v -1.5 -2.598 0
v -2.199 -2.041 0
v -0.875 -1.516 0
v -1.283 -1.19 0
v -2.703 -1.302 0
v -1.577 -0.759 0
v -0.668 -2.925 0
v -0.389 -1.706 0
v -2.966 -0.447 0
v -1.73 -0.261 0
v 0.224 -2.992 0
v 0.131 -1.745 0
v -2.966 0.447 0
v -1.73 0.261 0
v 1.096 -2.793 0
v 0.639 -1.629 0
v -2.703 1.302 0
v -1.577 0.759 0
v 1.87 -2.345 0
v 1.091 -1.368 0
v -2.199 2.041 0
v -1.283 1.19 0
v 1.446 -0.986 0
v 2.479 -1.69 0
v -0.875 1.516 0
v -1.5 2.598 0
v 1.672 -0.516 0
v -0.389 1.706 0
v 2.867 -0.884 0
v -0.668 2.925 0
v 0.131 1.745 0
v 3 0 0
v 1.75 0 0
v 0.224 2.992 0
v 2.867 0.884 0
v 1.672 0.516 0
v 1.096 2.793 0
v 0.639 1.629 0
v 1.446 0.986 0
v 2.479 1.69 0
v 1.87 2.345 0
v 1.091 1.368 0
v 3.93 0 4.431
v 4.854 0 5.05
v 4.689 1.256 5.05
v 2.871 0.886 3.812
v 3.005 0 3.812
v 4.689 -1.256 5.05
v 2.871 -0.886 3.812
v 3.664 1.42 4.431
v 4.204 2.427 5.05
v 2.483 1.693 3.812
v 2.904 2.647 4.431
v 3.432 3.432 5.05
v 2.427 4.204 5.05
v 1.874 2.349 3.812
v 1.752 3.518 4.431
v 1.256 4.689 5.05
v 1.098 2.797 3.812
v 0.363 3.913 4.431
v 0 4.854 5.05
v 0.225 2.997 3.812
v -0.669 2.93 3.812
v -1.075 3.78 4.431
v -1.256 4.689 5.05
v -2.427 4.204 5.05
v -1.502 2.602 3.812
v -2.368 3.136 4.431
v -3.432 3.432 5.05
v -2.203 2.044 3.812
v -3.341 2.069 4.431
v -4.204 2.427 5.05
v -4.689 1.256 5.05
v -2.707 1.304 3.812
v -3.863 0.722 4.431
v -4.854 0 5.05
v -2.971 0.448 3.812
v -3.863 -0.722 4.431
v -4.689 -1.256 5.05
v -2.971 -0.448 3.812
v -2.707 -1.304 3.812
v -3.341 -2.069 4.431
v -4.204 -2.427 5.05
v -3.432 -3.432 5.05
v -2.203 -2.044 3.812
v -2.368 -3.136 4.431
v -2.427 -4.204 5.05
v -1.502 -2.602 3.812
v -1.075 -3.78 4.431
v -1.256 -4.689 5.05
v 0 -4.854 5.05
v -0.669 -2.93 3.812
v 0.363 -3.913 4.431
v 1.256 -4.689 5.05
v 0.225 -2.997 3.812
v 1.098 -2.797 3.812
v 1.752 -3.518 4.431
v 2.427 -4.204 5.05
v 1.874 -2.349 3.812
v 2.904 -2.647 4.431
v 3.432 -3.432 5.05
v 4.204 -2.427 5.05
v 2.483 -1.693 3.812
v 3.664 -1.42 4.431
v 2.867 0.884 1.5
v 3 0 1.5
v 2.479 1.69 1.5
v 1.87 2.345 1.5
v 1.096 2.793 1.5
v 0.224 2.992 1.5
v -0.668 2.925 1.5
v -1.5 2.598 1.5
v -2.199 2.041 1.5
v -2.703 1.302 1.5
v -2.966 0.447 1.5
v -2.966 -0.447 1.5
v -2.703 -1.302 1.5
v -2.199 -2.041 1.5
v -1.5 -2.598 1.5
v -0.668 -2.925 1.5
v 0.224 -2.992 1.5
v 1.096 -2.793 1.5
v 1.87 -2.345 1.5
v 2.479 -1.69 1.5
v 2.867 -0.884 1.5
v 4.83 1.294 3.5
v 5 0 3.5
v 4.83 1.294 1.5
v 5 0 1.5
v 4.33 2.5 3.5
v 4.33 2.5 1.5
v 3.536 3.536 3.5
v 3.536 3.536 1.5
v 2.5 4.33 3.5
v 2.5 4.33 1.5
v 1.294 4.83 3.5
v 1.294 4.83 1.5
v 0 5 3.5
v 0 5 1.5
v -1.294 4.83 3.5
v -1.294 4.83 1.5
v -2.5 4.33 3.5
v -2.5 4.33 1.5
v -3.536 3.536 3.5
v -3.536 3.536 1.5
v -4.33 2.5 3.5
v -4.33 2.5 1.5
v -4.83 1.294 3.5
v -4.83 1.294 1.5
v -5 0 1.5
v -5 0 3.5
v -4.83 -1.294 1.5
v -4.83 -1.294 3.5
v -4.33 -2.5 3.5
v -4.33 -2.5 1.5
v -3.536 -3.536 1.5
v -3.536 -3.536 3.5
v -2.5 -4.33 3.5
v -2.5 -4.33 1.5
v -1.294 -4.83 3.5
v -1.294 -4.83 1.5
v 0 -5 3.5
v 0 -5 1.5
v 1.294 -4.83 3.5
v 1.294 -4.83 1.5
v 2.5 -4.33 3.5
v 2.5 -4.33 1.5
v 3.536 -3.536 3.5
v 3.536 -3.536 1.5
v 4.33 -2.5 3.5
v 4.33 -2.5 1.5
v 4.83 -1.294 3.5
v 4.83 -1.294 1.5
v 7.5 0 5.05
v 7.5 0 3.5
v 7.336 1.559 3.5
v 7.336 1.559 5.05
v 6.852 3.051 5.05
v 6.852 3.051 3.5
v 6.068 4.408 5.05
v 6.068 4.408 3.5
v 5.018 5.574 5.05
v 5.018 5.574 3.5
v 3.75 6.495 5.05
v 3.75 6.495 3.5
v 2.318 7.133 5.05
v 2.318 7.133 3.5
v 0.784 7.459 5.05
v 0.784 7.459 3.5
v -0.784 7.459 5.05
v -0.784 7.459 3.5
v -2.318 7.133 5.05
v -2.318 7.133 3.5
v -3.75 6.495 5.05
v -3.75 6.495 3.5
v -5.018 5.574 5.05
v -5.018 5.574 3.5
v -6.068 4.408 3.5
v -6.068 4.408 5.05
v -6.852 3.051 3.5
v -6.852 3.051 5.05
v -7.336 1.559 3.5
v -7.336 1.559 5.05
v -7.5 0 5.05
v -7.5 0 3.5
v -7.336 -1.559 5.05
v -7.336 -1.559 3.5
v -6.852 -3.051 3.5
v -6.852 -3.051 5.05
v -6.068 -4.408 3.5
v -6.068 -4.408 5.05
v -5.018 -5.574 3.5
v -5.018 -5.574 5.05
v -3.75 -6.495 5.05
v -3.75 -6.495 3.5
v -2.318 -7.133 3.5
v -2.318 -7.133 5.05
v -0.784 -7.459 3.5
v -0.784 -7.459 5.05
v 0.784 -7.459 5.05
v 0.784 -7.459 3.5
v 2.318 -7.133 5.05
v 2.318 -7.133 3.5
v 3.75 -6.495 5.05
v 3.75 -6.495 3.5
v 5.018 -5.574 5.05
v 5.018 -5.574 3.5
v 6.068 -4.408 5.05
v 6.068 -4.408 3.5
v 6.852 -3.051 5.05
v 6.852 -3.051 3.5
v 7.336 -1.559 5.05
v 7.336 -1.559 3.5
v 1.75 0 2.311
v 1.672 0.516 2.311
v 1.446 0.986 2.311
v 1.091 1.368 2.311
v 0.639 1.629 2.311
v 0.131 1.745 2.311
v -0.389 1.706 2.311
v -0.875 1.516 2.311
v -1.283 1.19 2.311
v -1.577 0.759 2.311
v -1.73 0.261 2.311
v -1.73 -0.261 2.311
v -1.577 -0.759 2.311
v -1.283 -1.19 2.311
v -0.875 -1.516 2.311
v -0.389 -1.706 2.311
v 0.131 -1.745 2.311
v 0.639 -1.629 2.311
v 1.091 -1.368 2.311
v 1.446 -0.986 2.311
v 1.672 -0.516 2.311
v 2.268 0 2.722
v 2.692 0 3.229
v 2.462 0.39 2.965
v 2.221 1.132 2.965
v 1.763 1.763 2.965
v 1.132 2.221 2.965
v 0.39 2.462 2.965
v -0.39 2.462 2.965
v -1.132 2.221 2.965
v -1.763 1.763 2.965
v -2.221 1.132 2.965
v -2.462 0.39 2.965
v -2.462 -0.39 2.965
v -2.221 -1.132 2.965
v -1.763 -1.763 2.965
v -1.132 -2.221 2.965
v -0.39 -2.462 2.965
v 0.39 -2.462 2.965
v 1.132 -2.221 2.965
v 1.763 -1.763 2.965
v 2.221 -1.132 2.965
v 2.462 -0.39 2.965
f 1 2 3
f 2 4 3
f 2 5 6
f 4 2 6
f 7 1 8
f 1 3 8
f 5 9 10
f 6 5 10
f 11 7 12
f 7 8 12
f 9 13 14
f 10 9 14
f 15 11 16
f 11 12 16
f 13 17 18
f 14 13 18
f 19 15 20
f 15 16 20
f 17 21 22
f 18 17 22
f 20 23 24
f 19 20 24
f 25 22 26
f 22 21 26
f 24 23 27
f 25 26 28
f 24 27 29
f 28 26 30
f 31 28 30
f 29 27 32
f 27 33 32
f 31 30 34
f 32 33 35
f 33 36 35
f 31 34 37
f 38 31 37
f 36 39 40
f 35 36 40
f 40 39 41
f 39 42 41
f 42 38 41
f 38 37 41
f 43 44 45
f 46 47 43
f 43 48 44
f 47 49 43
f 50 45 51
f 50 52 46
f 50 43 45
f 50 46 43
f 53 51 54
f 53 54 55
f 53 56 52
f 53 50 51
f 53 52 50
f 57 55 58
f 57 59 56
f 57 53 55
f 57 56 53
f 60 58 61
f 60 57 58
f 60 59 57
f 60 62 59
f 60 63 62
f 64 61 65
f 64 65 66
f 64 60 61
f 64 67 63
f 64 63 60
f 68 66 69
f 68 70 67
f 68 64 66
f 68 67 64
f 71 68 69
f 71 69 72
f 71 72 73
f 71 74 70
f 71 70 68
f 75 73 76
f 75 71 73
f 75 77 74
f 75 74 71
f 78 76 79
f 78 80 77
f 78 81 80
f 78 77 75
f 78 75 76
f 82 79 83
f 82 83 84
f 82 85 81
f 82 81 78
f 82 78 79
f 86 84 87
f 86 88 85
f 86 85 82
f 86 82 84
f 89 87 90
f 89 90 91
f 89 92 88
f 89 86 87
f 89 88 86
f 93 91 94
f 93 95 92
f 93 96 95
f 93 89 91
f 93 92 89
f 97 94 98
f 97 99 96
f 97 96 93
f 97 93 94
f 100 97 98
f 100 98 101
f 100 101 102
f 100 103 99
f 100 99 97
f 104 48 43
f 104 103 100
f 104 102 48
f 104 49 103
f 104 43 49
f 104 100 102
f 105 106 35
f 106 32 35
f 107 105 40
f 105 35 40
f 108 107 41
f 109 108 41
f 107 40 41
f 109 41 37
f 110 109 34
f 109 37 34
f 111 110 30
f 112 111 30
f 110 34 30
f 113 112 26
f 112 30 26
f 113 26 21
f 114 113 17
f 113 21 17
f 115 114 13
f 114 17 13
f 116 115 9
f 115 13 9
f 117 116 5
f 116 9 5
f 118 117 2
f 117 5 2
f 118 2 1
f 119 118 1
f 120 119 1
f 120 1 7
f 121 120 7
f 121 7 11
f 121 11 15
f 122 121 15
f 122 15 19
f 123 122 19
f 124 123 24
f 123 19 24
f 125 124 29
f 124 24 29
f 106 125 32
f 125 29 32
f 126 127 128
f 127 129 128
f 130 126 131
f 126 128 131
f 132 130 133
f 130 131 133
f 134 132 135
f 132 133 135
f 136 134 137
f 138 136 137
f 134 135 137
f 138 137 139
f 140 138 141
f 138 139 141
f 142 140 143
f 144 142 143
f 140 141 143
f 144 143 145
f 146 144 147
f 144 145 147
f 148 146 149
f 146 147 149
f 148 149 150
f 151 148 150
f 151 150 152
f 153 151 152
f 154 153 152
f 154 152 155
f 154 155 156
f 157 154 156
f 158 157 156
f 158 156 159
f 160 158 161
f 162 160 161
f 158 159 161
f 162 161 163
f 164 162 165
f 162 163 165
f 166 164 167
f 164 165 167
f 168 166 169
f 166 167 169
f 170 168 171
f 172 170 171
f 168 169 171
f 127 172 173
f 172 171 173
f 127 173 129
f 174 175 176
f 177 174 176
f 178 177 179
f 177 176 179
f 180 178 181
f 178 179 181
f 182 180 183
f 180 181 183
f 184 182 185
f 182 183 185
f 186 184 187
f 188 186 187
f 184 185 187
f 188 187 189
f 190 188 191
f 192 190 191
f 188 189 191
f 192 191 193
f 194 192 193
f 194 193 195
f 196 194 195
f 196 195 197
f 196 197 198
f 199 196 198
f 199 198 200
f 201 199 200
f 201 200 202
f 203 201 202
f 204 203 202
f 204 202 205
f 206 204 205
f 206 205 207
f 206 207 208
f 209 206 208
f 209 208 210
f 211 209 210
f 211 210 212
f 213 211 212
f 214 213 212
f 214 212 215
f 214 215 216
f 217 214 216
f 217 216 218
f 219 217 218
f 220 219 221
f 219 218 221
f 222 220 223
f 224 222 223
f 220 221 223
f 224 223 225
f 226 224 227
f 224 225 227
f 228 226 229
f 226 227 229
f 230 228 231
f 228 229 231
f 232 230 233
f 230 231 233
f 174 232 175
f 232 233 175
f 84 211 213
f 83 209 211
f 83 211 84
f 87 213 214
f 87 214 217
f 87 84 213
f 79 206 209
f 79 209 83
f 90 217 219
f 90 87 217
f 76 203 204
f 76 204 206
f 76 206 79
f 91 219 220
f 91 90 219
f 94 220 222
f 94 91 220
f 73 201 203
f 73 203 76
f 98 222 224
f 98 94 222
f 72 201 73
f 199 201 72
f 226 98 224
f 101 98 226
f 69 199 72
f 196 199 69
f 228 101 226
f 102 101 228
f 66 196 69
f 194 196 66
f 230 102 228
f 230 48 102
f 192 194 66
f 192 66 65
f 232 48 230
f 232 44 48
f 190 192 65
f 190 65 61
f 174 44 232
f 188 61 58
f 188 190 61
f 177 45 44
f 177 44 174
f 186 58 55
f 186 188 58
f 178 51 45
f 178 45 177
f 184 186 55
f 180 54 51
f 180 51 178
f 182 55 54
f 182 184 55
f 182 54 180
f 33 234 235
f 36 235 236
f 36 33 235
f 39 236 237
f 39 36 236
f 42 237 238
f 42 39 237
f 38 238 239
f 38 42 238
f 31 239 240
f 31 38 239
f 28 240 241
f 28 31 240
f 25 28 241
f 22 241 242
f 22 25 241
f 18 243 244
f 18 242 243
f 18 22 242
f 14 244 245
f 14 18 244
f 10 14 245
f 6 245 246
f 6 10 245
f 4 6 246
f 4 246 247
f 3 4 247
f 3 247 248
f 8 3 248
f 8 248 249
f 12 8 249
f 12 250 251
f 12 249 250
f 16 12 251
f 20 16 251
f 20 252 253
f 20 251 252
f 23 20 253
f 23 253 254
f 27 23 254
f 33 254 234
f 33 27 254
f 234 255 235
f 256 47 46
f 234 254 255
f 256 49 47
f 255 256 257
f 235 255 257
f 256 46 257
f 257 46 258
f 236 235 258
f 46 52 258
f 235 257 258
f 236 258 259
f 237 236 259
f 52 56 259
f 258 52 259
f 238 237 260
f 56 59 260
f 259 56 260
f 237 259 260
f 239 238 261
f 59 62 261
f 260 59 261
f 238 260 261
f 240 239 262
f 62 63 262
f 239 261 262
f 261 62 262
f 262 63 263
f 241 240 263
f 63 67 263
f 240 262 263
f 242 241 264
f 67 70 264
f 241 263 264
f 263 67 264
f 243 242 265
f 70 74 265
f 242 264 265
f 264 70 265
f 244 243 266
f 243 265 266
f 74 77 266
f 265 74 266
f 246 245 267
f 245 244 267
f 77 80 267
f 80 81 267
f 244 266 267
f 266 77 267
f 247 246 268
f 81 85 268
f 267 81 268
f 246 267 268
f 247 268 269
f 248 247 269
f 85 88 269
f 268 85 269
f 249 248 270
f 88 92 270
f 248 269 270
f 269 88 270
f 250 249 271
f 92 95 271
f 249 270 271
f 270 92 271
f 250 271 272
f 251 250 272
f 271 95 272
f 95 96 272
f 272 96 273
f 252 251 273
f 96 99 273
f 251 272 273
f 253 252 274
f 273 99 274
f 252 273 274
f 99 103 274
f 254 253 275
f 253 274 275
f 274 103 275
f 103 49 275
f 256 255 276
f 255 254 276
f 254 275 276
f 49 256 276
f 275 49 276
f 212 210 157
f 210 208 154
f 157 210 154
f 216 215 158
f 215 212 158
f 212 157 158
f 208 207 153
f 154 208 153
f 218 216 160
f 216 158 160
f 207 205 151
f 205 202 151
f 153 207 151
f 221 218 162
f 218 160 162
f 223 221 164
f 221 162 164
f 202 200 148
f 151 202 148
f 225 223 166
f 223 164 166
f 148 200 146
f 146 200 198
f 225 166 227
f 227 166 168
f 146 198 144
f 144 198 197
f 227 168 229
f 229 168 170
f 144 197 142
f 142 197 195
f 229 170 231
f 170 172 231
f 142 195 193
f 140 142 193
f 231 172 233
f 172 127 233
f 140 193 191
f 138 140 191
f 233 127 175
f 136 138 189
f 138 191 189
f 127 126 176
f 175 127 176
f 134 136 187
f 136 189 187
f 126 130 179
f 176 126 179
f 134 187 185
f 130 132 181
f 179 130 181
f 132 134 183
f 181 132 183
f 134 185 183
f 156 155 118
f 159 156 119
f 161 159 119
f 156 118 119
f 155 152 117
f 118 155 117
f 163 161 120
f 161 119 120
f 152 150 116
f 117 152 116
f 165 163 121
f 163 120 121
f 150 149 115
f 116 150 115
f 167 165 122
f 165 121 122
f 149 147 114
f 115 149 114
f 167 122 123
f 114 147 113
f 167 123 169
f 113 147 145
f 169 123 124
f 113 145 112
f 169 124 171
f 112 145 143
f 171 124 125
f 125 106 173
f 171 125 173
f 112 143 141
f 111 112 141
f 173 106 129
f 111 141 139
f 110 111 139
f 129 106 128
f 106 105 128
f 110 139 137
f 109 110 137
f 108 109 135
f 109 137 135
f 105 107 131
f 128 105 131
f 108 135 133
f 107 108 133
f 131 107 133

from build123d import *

# Parameters (mm, degrees)
F0_R     = 7.5
F0_R_2   = 1.75
F1_DEPTH = 5.05


# Not quite as in the source:
# - a fillet or chamfer that OpenCascade refuses, or shapes differently, is made with other operations: its cross-section is extruded or revolved along the edge and cut away or added


with BuildPart() as f1:
    # F0 (on Top) → F1 (new body)
    with BuildSketch(Plane.XY):
        Circle(F0_R)
        Circle(F0_R_2, mode=Mode.SUBTRACT)
    extrude(amount=F1_DEPTH)

    # F2 (on Front) → F3 (revolve, cut)
    with BuildSketch(Plane.XZ):
        Polygon((3, 1.5), (3, 0), (7.75, 0), (7.75, 3.5), (5, 3.5), (5, 1.5), align=None)
        with BuildLine():
            Line((0, 5.05), (0, 1.8))
            ThreePointArc((0, 1.8), (3.25, 5.05), (0, 8.3))
            Line((0, 8.3), (0, 5.05))
        make_face()
    revolve(axis=Axis((0, 0, 2.525), (0, 0, 1)), mode=Mode.SUBTRACT)

    # F4: chamfer of 2 on 1 edges, made by hand

    # F4_s1 → F4_t2 (revolve, cut)
    with BuildSketch(Plane.XZ):
        with BuildLine():
            Line((4.8541219597, 5.05), (3.0049326417, 3.8119047619))
            ThreePointArc((3.0049326417, 3.8119047619), (3.1823683685, 4.3904307714), (3.25, 5.05))
            Line((3.25, 5.05), (4.8541219597, 5.05))
        make_face()
    revolve(axis=Axis((0, 0, 5.05), (0, 0, 1)), mode=Mode.SUBTRACT)


solid = f1.part
